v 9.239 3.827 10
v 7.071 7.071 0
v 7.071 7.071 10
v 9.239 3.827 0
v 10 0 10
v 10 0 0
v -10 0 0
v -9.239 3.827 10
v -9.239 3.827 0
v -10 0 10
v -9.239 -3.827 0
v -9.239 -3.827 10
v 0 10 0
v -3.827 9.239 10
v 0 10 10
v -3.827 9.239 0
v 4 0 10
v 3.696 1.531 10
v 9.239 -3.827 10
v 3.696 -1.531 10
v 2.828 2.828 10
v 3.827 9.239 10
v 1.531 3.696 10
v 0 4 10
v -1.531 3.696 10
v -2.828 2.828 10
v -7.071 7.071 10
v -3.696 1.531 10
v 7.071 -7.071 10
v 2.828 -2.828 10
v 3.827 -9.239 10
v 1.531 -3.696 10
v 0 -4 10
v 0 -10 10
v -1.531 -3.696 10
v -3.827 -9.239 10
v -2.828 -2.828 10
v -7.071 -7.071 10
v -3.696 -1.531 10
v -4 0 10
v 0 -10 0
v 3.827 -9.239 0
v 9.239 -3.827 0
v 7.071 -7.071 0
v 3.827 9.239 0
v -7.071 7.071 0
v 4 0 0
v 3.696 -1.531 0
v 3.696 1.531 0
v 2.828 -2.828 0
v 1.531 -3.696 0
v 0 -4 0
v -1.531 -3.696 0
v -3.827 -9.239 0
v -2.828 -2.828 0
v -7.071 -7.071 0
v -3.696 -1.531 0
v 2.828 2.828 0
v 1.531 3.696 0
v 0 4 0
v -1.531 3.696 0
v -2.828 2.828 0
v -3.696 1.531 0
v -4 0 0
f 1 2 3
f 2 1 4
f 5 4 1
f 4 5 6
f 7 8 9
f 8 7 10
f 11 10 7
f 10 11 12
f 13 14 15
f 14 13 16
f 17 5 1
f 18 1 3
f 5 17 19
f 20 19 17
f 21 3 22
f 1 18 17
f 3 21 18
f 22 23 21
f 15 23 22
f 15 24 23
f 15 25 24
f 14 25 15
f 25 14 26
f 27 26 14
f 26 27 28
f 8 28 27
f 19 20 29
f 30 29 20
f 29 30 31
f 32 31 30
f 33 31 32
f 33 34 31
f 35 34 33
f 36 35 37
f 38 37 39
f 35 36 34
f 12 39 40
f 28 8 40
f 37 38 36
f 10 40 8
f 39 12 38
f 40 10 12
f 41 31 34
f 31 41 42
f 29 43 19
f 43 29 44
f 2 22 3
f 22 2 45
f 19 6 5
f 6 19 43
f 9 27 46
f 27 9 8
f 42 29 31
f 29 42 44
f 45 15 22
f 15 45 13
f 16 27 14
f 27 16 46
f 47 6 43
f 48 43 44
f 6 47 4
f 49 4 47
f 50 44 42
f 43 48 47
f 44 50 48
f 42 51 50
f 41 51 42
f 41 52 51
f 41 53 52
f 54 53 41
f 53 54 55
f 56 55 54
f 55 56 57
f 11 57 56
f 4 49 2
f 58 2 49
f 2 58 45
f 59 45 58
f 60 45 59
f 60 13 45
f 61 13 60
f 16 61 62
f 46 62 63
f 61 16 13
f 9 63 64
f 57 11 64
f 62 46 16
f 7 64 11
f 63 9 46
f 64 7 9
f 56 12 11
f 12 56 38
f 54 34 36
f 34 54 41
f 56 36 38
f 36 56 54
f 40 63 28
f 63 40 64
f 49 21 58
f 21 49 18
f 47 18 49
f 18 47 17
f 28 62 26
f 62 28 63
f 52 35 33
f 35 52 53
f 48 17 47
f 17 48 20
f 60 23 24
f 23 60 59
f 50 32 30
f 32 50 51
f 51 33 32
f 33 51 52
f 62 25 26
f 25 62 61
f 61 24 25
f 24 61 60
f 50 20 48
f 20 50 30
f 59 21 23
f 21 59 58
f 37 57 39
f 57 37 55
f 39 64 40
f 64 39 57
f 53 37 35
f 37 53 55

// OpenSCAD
// A bored cylinder. The top and the bottom face are annuli, so this is the
// fixture for the hole handling:
//   - the hole loop has to become an inner FACE_BOUND of the ring face, not a
//     face of its own (which shows up as a membrane spanning the bore)
//   - the ring face has to keep exactly one FACE_OUTER_BOUND
// The rounded coordinates also make this the fixture for the number
// formatting: on a locale with a comma radix a coordinate such as 7.0710678
// would be written as "7,0710678" and split into two arguments.
//
// Measured, and asserted by the driver: what the exporter has to report for
// the above to have happened. A silently faceted export is still a valid one,
// so validity alone cannot see a recogniser that has stopped recognising.
// EXPECT: 2 analytic surfaces available (2 cylindrical, 0 spherical, 0 toroidal, 0 Bezier)
// EXPECT: 2 surfaces recognised (0 toroidal, 0 spherical, 0 conical, 0 partial), 32 facets replaced
//
// Both walls are exact, so the bore takes exactly its own area away:
// pi*(10^2 - 4^2)*10 = 840*pi. A bore written at the wrong radius, or as the
// 16-gon it is in the mesh, lands somewhere else.
// ROUNDTRIP: Cylinder=2 Plane=2
// VOLUME: 2638.9378290
$fn = 16;
difference() {
  cylinder(h = 10, r = 10);
  translate([0, 0, -1]) cylinder(h = 12, r = 4);
}
